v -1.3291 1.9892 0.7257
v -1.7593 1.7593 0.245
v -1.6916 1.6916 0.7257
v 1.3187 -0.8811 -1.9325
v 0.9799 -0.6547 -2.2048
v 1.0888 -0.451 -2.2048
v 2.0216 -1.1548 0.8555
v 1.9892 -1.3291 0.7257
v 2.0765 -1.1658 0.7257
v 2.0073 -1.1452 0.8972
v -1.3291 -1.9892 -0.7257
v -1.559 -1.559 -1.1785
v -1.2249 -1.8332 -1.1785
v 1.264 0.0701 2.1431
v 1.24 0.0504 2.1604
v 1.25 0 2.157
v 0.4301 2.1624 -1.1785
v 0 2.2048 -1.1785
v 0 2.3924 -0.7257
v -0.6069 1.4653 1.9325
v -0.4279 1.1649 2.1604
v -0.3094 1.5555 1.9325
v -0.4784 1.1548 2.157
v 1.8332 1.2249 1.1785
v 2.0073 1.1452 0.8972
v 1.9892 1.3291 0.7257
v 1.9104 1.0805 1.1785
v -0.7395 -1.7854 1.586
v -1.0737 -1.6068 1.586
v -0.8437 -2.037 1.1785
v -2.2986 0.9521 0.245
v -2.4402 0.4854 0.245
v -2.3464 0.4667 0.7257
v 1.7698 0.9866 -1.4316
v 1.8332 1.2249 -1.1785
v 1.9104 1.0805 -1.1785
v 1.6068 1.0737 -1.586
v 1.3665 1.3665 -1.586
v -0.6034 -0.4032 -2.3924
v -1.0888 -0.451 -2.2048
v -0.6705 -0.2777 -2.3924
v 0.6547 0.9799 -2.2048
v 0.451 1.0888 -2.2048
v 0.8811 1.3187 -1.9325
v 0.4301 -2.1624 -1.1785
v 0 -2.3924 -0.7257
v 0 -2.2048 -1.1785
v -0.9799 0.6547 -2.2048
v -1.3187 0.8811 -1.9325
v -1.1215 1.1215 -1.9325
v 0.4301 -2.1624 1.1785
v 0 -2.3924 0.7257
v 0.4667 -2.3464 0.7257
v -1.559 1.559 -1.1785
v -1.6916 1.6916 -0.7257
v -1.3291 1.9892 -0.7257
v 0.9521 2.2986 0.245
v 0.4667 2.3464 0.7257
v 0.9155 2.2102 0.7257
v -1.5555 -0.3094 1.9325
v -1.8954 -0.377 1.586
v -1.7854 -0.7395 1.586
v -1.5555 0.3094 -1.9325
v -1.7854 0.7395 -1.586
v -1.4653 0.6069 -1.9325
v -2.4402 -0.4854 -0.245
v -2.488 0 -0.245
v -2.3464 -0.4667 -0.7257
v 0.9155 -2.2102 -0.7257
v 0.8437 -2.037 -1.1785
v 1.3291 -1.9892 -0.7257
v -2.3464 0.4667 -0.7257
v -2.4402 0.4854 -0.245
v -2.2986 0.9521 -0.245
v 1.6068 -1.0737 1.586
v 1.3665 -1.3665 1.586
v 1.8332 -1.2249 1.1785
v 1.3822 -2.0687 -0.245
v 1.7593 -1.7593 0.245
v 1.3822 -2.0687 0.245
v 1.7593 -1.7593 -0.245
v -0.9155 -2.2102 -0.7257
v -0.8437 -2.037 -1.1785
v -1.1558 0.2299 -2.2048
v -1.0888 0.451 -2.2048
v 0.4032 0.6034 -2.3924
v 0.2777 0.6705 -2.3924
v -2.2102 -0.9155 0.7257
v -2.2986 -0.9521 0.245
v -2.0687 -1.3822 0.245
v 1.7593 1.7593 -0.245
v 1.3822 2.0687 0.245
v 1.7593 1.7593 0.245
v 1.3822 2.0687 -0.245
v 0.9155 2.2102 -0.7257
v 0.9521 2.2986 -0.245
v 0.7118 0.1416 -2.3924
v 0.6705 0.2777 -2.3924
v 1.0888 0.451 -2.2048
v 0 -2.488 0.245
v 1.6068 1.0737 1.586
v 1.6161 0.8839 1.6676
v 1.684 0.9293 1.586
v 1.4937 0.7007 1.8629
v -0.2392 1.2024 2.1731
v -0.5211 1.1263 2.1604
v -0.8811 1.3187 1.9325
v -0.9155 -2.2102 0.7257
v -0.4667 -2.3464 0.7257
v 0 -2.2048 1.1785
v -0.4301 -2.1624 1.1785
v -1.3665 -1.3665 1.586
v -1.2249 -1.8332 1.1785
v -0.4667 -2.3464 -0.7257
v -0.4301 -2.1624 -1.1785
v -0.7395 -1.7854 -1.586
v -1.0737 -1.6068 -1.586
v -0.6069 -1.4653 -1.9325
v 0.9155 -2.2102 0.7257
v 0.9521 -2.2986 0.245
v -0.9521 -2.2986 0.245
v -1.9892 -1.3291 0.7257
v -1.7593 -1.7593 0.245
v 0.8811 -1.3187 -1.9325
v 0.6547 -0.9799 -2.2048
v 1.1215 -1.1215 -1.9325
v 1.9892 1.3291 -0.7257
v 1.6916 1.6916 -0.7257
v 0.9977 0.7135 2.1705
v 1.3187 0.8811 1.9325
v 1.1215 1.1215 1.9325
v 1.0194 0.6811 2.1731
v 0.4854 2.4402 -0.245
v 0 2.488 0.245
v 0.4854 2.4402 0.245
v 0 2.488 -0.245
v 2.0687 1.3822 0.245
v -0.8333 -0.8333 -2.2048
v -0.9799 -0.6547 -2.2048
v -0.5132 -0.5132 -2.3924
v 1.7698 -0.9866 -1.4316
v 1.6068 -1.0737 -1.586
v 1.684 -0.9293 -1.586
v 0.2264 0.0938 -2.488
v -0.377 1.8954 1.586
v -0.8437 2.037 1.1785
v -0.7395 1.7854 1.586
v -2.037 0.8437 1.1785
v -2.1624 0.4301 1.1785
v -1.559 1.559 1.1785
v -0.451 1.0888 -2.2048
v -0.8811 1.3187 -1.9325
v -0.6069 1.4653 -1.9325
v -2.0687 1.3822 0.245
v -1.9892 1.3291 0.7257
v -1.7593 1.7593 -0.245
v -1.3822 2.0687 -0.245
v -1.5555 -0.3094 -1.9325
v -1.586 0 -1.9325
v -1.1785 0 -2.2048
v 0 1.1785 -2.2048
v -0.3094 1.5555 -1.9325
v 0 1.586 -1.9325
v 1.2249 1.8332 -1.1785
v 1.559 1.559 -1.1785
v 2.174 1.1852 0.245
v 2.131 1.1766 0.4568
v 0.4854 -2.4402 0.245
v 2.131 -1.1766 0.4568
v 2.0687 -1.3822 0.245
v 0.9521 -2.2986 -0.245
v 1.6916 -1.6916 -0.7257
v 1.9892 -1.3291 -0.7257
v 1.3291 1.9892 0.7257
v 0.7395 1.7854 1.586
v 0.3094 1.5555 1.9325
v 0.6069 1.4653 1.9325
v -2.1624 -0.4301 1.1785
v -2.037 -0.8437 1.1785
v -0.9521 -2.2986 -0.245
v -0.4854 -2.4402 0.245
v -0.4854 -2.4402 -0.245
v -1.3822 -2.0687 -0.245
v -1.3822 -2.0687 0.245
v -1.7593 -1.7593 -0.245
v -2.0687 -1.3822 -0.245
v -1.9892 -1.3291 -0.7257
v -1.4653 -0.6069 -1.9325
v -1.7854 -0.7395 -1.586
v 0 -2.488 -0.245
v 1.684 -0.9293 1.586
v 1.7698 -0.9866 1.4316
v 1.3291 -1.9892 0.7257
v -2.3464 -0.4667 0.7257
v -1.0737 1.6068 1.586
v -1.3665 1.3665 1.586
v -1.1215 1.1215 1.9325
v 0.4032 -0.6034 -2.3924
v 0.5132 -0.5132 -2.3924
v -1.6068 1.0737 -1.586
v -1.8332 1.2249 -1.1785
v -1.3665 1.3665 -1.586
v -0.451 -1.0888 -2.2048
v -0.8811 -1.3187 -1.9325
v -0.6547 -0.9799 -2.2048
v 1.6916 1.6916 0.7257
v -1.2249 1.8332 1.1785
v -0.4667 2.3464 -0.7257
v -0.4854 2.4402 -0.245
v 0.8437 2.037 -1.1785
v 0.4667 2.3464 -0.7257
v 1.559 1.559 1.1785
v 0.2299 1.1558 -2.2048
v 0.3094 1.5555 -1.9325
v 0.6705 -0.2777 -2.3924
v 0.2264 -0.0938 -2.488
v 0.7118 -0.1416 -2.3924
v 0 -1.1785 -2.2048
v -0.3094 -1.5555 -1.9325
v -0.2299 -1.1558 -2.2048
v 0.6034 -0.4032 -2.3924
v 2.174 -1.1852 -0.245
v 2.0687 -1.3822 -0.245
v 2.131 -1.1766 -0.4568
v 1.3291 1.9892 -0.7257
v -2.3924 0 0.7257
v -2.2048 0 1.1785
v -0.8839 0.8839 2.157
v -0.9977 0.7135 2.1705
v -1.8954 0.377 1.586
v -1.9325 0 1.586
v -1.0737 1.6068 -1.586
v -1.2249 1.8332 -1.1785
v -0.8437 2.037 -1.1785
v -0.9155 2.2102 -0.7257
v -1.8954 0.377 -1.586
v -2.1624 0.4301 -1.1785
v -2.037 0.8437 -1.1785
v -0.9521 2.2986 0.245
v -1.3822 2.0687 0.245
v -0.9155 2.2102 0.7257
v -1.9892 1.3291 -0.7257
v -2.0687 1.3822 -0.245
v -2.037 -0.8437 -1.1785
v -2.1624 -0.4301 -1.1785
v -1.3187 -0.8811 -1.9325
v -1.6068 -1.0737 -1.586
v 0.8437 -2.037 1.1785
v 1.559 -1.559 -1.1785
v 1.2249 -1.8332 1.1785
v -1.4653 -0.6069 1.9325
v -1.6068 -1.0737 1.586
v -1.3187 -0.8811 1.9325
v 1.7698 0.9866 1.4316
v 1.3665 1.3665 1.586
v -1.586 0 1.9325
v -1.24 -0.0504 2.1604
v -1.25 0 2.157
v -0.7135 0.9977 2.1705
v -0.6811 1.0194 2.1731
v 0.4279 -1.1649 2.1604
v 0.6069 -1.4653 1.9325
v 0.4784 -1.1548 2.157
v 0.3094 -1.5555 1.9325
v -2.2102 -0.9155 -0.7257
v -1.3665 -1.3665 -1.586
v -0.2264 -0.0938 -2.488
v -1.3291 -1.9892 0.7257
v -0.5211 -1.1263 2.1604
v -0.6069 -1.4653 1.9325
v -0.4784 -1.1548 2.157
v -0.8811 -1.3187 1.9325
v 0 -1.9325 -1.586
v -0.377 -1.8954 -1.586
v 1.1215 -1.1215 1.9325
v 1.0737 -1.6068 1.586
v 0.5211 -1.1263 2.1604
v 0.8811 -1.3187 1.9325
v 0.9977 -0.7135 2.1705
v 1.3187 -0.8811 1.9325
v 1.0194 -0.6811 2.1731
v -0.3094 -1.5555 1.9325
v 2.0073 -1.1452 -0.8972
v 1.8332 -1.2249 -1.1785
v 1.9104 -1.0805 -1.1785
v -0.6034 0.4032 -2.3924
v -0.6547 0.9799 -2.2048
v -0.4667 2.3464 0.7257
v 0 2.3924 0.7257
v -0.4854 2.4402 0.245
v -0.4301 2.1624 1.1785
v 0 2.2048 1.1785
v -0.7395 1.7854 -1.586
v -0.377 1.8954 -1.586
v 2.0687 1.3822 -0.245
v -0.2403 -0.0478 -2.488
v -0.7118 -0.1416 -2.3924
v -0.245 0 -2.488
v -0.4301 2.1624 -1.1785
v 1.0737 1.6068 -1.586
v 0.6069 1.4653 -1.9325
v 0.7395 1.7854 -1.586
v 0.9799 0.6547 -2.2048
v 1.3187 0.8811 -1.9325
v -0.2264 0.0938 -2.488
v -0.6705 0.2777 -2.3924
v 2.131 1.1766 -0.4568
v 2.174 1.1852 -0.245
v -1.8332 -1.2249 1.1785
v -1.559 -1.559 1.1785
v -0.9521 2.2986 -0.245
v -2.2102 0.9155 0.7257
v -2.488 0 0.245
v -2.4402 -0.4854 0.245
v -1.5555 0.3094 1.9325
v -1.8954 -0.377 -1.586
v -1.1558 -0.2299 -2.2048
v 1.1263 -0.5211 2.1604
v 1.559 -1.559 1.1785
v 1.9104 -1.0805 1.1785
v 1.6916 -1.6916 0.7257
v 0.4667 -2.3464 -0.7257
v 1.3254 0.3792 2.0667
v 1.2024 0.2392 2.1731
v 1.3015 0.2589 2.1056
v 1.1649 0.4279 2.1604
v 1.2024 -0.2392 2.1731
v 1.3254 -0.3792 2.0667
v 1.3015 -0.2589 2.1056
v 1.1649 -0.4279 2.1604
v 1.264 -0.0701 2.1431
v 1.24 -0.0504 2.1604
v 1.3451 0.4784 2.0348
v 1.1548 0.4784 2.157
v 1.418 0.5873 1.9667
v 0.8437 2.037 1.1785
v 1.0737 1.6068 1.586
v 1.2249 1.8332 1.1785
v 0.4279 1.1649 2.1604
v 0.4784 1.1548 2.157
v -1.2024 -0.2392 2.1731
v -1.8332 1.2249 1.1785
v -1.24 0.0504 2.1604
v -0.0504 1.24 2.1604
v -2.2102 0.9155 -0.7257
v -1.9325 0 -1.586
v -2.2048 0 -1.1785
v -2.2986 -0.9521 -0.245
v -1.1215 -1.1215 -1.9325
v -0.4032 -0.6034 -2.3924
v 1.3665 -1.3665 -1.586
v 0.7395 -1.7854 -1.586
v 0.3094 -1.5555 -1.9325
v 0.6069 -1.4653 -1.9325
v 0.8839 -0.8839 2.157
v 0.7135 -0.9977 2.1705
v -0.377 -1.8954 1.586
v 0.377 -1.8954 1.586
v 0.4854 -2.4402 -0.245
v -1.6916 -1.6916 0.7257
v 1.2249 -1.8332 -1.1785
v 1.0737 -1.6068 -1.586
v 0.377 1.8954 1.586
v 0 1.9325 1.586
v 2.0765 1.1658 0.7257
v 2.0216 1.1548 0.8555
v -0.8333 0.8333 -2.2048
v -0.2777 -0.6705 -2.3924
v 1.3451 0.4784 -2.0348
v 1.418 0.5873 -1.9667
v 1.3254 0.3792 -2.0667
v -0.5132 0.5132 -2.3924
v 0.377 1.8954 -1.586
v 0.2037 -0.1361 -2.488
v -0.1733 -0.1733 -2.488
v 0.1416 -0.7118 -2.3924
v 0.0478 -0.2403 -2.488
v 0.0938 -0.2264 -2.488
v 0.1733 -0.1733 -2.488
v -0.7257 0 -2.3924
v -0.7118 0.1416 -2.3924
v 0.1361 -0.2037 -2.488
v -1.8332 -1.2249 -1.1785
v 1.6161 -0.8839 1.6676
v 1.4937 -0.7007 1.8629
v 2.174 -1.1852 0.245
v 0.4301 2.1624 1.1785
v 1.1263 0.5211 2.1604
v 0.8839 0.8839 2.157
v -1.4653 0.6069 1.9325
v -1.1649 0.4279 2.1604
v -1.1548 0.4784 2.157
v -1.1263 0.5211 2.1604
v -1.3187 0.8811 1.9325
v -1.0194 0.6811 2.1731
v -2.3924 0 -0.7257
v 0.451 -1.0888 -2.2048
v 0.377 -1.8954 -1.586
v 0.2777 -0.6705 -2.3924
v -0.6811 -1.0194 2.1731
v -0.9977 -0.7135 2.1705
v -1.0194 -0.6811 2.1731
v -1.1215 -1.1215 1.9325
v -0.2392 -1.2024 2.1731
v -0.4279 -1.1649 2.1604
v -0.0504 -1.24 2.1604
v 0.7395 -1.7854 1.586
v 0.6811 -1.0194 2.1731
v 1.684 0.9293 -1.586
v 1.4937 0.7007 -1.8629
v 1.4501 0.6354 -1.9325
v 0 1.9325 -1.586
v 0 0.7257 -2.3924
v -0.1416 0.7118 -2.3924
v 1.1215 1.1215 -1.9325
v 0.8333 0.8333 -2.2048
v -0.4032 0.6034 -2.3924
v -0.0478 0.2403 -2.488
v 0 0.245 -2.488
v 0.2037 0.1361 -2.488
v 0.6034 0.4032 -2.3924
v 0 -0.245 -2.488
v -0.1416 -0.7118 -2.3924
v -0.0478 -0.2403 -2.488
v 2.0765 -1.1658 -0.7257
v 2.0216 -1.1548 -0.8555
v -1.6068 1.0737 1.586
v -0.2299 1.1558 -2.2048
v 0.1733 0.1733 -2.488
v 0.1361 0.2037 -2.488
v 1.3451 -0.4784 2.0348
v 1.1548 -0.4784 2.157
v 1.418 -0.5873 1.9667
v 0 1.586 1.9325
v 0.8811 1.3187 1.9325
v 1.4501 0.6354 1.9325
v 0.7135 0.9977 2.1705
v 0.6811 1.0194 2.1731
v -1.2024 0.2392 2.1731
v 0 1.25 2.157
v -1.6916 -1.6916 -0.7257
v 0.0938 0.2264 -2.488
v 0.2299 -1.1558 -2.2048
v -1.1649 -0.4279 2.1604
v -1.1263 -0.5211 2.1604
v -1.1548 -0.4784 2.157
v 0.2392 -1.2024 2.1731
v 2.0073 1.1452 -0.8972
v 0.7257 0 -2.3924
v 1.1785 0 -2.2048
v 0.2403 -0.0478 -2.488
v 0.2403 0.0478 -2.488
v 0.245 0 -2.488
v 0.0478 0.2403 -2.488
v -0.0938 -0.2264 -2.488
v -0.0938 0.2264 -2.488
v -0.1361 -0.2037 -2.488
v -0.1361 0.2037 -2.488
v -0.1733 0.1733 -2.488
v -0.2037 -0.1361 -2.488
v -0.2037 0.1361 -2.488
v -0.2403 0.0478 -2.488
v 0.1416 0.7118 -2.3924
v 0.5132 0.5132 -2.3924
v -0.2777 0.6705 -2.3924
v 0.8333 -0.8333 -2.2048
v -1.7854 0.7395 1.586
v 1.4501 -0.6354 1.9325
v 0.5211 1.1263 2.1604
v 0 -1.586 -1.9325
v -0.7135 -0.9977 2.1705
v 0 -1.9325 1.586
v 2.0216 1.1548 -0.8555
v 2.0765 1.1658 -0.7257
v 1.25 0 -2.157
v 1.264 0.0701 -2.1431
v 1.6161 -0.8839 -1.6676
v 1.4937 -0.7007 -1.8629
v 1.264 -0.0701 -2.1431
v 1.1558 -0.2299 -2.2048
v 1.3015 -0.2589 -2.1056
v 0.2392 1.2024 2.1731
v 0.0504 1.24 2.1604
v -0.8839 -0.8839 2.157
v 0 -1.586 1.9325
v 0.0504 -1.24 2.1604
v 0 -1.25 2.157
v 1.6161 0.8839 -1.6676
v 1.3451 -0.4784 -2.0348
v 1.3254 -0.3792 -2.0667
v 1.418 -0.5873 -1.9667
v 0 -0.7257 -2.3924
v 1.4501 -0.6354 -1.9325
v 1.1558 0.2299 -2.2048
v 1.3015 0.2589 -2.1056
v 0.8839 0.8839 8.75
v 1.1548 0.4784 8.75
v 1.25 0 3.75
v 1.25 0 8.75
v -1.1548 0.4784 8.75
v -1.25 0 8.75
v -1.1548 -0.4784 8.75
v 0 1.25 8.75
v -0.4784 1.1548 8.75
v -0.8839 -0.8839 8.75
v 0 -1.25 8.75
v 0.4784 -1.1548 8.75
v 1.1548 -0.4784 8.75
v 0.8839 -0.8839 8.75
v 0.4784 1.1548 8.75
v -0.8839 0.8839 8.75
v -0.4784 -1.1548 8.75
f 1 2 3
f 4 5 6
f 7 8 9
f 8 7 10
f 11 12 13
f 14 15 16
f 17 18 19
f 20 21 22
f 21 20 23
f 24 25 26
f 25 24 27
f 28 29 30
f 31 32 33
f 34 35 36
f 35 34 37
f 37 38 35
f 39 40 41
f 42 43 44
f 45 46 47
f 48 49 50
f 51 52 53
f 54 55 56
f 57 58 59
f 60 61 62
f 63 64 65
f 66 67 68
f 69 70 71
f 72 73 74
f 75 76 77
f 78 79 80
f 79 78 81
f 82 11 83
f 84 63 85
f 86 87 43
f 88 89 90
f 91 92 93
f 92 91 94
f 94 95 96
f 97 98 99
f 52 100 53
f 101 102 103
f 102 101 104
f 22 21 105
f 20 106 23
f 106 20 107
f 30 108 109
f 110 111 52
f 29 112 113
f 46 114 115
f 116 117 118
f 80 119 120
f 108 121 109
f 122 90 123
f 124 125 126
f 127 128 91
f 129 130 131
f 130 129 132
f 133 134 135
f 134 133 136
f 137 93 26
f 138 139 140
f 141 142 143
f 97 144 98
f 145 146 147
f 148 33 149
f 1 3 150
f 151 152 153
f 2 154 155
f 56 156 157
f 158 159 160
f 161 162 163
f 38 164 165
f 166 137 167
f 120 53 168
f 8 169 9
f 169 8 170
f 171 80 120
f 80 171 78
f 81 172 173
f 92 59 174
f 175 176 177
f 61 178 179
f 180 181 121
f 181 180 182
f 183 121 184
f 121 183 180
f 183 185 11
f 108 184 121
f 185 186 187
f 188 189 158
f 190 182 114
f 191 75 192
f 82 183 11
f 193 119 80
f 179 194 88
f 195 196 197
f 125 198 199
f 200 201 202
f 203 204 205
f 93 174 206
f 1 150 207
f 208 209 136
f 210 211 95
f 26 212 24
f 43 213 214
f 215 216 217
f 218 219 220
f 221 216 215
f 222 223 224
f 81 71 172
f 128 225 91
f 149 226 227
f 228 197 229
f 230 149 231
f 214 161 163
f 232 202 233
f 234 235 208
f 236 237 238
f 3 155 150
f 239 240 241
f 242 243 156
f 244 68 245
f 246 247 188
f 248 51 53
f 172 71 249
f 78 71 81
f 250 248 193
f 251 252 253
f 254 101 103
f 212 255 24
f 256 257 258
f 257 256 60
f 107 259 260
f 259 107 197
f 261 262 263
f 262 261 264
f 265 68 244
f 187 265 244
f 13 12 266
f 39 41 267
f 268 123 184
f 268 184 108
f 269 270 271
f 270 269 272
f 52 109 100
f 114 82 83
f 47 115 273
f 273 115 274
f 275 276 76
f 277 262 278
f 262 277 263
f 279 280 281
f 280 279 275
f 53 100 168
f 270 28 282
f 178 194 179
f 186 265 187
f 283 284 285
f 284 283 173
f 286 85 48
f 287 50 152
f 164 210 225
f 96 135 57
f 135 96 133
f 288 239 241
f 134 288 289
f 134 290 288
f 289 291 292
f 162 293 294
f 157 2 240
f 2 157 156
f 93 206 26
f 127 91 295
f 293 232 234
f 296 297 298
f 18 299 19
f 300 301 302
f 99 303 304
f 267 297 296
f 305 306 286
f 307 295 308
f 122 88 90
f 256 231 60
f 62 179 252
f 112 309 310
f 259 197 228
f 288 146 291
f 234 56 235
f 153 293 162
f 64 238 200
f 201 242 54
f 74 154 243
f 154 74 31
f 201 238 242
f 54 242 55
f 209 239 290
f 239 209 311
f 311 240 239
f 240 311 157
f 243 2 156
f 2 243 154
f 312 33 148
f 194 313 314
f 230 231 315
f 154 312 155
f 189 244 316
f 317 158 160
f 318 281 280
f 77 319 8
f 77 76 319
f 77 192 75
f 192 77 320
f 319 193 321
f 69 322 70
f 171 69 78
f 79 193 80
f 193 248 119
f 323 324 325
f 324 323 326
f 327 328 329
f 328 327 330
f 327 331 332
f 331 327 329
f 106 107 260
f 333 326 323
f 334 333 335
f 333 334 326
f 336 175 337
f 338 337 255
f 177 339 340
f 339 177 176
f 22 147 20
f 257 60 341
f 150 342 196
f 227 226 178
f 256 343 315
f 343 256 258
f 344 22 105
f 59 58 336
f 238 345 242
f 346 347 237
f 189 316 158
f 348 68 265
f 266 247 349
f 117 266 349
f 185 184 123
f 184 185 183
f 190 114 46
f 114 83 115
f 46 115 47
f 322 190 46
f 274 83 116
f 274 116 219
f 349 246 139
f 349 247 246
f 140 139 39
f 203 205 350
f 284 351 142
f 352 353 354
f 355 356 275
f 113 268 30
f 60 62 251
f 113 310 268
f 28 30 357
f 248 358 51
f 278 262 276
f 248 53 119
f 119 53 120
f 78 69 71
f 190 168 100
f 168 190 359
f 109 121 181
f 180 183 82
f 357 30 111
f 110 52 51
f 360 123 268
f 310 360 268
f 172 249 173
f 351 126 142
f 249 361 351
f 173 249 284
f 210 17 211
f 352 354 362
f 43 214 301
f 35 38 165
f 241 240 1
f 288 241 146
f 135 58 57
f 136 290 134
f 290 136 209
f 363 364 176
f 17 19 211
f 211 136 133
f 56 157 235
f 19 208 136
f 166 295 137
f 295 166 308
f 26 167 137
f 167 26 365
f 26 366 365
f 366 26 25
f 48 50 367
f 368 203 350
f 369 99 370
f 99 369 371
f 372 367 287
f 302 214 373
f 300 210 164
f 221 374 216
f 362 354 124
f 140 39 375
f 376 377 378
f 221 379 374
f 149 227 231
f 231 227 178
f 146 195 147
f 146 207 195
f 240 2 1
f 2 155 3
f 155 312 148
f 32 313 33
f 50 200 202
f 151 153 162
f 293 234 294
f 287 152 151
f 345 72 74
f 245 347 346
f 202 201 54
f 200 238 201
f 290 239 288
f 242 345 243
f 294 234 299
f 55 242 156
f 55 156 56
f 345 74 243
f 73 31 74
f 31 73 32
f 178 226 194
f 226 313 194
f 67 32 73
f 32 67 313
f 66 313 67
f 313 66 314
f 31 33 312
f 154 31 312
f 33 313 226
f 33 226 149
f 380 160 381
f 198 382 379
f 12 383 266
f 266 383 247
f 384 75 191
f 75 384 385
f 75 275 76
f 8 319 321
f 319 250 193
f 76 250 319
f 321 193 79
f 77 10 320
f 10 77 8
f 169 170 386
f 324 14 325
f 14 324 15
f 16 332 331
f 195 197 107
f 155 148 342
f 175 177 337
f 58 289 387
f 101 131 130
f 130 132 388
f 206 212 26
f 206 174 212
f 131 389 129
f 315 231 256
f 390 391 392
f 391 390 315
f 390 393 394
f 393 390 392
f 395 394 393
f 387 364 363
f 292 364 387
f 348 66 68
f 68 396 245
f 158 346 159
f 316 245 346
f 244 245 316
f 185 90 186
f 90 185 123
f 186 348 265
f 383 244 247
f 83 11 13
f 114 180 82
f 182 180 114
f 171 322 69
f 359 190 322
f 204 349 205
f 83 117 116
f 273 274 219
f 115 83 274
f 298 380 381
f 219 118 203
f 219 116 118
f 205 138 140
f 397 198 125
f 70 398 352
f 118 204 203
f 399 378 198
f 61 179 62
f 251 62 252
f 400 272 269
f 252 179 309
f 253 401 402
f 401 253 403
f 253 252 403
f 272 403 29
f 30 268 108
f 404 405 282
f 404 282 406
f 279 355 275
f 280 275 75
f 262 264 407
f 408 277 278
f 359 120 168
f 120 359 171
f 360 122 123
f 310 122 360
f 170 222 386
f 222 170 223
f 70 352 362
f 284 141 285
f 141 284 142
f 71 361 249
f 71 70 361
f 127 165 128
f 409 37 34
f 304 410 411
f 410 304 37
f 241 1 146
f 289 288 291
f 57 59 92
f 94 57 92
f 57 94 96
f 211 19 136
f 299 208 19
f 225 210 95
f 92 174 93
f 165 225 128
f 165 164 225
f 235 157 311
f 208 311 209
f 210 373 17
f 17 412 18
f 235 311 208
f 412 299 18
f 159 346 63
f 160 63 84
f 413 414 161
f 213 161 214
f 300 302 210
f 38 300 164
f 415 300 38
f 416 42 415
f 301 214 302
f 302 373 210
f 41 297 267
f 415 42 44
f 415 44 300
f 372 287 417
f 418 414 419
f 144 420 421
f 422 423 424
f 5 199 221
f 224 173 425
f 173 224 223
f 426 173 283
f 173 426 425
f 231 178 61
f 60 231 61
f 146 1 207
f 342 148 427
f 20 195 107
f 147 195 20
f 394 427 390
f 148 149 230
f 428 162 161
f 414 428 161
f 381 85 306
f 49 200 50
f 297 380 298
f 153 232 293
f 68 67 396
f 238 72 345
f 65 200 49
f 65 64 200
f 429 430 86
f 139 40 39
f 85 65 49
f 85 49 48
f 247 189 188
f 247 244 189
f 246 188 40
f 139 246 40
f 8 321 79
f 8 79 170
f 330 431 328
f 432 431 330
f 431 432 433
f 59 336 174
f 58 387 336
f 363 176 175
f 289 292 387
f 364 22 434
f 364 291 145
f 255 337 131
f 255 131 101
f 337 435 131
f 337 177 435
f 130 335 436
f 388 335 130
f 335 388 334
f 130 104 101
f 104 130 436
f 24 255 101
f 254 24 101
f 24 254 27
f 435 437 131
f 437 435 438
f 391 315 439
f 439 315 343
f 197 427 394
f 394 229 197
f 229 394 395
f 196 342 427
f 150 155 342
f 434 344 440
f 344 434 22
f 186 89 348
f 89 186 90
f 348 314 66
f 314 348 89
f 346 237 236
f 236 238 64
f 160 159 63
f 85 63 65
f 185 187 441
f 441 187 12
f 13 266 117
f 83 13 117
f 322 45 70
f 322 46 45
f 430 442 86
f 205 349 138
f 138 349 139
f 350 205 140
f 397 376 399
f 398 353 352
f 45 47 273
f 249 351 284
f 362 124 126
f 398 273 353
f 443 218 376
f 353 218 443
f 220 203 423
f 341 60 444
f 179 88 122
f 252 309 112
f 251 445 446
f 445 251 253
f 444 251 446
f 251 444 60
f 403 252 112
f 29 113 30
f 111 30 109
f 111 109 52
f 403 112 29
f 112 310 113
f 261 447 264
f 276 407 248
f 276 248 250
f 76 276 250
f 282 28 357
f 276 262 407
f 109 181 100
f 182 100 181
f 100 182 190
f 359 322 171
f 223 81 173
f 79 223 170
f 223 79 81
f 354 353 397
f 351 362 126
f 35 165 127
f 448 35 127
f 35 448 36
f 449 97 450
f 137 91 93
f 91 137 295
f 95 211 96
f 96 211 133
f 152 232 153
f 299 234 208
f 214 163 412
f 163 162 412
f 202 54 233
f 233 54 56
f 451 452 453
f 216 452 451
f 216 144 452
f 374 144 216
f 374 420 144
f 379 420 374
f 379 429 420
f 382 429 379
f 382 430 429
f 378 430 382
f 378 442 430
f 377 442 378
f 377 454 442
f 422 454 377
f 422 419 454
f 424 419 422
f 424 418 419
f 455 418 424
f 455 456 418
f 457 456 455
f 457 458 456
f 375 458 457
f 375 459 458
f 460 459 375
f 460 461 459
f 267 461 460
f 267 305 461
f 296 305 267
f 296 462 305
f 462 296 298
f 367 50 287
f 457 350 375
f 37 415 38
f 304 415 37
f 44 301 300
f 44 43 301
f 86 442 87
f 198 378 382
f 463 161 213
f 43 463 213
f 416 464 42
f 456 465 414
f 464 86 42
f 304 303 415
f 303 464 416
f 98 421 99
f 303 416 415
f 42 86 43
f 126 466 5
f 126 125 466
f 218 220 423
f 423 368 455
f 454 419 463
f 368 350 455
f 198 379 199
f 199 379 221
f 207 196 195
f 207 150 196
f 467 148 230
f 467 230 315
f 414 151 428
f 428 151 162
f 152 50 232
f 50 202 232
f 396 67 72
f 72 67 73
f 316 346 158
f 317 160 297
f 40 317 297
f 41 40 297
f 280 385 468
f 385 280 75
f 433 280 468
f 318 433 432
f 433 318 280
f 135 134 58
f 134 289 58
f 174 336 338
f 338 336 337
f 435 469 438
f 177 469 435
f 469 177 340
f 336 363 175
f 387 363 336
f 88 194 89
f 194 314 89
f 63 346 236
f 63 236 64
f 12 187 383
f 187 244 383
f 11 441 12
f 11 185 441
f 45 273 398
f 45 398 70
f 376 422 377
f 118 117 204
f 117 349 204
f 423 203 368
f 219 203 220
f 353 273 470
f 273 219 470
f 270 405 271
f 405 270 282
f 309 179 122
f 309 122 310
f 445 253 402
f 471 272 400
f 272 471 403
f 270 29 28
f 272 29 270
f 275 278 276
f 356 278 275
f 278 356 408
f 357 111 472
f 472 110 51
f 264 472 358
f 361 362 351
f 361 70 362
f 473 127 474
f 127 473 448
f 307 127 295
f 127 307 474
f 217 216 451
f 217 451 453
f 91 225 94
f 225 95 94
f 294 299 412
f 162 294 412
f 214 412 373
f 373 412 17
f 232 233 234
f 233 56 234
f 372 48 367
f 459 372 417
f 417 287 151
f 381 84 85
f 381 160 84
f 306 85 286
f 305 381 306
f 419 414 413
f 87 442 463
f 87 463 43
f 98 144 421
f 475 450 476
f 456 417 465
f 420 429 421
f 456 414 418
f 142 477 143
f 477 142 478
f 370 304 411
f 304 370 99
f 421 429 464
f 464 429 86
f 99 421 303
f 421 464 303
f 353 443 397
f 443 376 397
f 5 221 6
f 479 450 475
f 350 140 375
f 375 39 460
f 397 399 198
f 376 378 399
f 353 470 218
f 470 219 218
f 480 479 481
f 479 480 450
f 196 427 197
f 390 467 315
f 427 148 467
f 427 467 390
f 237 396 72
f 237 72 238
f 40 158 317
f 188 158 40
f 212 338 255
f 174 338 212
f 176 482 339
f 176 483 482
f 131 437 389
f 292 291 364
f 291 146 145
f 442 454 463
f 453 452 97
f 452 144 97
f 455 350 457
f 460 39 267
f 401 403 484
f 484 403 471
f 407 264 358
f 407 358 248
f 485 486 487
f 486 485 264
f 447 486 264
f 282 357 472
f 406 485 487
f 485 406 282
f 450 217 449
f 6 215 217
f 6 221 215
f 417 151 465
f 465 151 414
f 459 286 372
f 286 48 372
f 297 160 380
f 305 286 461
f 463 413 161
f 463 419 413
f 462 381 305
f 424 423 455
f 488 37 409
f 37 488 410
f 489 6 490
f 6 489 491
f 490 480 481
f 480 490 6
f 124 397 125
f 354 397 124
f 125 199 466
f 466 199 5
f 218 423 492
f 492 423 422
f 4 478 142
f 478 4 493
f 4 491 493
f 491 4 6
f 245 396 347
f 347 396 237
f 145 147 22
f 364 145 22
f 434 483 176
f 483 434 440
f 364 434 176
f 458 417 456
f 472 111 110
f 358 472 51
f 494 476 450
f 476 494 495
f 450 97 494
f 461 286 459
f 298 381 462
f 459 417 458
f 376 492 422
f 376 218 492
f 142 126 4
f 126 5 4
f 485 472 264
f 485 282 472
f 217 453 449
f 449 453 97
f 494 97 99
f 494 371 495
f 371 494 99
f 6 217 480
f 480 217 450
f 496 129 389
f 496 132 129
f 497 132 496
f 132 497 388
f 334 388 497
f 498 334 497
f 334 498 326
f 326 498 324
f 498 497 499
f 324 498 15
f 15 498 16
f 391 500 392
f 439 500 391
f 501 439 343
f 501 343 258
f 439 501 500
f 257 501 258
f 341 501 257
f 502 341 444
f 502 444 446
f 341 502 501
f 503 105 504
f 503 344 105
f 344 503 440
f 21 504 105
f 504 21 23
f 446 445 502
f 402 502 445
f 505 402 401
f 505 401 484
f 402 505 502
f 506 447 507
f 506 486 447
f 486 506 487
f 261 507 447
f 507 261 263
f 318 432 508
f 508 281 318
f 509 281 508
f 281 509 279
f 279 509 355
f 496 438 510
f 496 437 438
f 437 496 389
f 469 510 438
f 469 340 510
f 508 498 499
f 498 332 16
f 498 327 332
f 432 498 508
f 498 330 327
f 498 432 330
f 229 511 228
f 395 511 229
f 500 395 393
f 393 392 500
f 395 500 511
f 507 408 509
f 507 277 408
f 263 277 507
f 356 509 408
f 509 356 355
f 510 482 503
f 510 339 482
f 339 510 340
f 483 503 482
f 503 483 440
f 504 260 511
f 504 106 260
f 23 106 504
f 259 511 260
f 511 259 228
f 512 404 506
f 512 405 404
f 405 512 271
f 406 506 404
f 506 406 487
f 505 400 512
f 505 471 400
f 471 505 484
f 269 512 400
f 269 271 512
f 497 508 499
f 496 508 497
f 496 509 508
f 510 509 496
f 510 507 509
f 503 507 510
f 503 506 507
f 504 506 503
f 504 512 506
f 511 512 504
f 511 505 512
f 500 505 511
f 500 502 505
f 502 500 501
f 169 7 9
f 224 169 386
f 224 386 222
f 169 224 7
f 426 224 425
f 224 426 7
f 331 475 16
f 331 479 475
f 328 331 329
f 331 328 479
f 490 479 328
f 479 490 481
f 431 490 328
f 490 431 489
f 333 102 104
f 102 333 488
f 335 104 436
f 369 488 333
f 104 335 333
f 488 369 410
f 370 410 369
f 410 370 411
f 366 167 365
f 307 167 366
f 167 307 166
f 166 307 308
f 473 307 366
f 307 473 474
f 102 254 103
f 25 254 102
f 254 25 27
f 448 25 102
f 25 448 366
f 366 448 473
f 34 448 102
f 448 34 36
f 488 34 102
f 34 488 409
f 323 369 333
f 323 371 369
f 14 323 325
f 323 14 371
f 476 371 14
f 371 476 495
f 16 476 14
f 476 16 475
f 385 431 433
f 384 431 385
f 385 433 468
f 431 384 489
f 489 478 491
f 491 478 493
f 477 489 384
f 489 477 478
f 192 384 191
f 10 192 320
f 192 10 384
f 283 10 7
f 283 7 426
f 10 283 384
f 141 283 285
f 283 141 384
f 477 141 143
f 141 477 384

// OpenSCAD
// http://www.tridimake.com/2014/09/how-to-use-openscad-tricks-and-tips-to.html
$fa=0.5; // default minimum facet angle is now 0.5
$fs=0.5; // default minimum facet size is now 0.5 mm
p = 2.5;
difference() {
    union() {
        color([1, 0, 0]) sphere(p);
        translate([0,0,p/2]) cylinder(r=p/2, h=p*3, center=false);    
    }
    translate([p,0,0]) cylinder(r=p/2, h=p*3, center=true);
}
